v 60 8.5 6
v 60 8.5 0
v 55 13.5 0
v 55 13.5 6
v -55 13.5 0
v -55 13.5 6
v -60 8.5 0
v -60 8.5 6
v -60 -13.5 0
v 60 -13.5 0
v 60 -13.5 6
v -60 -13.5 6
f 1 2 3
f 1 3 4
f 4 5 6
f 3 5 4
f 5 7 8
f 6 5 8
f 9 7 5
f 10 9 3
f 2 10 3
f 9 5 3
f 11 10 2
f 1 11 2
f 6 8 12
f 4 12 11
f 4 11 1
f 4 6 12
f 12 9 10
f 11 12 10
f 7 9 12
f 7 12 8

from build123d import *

# Parameters (mm, degrees)
SKETCH_1_W      = 120
SKETCH_1_H      = 27
EXTRUDE_1_DEPTH = 6
CHAMFER_1_SIZE  = 5


with BuildPart() as part:
    # 草图1 → 凸台-拉伸1 (new body)
    with BuildSketch(Plane.XY):
        Rectangle(SKETCH_1_W, SKETCH_1_H)
    extrude(amount=EXTRUDE_1_DEPTH)

    # 倒角1
    chamfer_1_edges = [part.edges().sort_by_distance(p)[0] for p in [
        (-60, 13.5, 3),
        (60, 13.5, 3),
    ]]
    chamfer(chamfer_1_edges, length=CHAMFER_1_SIZE)


solid = part.part
